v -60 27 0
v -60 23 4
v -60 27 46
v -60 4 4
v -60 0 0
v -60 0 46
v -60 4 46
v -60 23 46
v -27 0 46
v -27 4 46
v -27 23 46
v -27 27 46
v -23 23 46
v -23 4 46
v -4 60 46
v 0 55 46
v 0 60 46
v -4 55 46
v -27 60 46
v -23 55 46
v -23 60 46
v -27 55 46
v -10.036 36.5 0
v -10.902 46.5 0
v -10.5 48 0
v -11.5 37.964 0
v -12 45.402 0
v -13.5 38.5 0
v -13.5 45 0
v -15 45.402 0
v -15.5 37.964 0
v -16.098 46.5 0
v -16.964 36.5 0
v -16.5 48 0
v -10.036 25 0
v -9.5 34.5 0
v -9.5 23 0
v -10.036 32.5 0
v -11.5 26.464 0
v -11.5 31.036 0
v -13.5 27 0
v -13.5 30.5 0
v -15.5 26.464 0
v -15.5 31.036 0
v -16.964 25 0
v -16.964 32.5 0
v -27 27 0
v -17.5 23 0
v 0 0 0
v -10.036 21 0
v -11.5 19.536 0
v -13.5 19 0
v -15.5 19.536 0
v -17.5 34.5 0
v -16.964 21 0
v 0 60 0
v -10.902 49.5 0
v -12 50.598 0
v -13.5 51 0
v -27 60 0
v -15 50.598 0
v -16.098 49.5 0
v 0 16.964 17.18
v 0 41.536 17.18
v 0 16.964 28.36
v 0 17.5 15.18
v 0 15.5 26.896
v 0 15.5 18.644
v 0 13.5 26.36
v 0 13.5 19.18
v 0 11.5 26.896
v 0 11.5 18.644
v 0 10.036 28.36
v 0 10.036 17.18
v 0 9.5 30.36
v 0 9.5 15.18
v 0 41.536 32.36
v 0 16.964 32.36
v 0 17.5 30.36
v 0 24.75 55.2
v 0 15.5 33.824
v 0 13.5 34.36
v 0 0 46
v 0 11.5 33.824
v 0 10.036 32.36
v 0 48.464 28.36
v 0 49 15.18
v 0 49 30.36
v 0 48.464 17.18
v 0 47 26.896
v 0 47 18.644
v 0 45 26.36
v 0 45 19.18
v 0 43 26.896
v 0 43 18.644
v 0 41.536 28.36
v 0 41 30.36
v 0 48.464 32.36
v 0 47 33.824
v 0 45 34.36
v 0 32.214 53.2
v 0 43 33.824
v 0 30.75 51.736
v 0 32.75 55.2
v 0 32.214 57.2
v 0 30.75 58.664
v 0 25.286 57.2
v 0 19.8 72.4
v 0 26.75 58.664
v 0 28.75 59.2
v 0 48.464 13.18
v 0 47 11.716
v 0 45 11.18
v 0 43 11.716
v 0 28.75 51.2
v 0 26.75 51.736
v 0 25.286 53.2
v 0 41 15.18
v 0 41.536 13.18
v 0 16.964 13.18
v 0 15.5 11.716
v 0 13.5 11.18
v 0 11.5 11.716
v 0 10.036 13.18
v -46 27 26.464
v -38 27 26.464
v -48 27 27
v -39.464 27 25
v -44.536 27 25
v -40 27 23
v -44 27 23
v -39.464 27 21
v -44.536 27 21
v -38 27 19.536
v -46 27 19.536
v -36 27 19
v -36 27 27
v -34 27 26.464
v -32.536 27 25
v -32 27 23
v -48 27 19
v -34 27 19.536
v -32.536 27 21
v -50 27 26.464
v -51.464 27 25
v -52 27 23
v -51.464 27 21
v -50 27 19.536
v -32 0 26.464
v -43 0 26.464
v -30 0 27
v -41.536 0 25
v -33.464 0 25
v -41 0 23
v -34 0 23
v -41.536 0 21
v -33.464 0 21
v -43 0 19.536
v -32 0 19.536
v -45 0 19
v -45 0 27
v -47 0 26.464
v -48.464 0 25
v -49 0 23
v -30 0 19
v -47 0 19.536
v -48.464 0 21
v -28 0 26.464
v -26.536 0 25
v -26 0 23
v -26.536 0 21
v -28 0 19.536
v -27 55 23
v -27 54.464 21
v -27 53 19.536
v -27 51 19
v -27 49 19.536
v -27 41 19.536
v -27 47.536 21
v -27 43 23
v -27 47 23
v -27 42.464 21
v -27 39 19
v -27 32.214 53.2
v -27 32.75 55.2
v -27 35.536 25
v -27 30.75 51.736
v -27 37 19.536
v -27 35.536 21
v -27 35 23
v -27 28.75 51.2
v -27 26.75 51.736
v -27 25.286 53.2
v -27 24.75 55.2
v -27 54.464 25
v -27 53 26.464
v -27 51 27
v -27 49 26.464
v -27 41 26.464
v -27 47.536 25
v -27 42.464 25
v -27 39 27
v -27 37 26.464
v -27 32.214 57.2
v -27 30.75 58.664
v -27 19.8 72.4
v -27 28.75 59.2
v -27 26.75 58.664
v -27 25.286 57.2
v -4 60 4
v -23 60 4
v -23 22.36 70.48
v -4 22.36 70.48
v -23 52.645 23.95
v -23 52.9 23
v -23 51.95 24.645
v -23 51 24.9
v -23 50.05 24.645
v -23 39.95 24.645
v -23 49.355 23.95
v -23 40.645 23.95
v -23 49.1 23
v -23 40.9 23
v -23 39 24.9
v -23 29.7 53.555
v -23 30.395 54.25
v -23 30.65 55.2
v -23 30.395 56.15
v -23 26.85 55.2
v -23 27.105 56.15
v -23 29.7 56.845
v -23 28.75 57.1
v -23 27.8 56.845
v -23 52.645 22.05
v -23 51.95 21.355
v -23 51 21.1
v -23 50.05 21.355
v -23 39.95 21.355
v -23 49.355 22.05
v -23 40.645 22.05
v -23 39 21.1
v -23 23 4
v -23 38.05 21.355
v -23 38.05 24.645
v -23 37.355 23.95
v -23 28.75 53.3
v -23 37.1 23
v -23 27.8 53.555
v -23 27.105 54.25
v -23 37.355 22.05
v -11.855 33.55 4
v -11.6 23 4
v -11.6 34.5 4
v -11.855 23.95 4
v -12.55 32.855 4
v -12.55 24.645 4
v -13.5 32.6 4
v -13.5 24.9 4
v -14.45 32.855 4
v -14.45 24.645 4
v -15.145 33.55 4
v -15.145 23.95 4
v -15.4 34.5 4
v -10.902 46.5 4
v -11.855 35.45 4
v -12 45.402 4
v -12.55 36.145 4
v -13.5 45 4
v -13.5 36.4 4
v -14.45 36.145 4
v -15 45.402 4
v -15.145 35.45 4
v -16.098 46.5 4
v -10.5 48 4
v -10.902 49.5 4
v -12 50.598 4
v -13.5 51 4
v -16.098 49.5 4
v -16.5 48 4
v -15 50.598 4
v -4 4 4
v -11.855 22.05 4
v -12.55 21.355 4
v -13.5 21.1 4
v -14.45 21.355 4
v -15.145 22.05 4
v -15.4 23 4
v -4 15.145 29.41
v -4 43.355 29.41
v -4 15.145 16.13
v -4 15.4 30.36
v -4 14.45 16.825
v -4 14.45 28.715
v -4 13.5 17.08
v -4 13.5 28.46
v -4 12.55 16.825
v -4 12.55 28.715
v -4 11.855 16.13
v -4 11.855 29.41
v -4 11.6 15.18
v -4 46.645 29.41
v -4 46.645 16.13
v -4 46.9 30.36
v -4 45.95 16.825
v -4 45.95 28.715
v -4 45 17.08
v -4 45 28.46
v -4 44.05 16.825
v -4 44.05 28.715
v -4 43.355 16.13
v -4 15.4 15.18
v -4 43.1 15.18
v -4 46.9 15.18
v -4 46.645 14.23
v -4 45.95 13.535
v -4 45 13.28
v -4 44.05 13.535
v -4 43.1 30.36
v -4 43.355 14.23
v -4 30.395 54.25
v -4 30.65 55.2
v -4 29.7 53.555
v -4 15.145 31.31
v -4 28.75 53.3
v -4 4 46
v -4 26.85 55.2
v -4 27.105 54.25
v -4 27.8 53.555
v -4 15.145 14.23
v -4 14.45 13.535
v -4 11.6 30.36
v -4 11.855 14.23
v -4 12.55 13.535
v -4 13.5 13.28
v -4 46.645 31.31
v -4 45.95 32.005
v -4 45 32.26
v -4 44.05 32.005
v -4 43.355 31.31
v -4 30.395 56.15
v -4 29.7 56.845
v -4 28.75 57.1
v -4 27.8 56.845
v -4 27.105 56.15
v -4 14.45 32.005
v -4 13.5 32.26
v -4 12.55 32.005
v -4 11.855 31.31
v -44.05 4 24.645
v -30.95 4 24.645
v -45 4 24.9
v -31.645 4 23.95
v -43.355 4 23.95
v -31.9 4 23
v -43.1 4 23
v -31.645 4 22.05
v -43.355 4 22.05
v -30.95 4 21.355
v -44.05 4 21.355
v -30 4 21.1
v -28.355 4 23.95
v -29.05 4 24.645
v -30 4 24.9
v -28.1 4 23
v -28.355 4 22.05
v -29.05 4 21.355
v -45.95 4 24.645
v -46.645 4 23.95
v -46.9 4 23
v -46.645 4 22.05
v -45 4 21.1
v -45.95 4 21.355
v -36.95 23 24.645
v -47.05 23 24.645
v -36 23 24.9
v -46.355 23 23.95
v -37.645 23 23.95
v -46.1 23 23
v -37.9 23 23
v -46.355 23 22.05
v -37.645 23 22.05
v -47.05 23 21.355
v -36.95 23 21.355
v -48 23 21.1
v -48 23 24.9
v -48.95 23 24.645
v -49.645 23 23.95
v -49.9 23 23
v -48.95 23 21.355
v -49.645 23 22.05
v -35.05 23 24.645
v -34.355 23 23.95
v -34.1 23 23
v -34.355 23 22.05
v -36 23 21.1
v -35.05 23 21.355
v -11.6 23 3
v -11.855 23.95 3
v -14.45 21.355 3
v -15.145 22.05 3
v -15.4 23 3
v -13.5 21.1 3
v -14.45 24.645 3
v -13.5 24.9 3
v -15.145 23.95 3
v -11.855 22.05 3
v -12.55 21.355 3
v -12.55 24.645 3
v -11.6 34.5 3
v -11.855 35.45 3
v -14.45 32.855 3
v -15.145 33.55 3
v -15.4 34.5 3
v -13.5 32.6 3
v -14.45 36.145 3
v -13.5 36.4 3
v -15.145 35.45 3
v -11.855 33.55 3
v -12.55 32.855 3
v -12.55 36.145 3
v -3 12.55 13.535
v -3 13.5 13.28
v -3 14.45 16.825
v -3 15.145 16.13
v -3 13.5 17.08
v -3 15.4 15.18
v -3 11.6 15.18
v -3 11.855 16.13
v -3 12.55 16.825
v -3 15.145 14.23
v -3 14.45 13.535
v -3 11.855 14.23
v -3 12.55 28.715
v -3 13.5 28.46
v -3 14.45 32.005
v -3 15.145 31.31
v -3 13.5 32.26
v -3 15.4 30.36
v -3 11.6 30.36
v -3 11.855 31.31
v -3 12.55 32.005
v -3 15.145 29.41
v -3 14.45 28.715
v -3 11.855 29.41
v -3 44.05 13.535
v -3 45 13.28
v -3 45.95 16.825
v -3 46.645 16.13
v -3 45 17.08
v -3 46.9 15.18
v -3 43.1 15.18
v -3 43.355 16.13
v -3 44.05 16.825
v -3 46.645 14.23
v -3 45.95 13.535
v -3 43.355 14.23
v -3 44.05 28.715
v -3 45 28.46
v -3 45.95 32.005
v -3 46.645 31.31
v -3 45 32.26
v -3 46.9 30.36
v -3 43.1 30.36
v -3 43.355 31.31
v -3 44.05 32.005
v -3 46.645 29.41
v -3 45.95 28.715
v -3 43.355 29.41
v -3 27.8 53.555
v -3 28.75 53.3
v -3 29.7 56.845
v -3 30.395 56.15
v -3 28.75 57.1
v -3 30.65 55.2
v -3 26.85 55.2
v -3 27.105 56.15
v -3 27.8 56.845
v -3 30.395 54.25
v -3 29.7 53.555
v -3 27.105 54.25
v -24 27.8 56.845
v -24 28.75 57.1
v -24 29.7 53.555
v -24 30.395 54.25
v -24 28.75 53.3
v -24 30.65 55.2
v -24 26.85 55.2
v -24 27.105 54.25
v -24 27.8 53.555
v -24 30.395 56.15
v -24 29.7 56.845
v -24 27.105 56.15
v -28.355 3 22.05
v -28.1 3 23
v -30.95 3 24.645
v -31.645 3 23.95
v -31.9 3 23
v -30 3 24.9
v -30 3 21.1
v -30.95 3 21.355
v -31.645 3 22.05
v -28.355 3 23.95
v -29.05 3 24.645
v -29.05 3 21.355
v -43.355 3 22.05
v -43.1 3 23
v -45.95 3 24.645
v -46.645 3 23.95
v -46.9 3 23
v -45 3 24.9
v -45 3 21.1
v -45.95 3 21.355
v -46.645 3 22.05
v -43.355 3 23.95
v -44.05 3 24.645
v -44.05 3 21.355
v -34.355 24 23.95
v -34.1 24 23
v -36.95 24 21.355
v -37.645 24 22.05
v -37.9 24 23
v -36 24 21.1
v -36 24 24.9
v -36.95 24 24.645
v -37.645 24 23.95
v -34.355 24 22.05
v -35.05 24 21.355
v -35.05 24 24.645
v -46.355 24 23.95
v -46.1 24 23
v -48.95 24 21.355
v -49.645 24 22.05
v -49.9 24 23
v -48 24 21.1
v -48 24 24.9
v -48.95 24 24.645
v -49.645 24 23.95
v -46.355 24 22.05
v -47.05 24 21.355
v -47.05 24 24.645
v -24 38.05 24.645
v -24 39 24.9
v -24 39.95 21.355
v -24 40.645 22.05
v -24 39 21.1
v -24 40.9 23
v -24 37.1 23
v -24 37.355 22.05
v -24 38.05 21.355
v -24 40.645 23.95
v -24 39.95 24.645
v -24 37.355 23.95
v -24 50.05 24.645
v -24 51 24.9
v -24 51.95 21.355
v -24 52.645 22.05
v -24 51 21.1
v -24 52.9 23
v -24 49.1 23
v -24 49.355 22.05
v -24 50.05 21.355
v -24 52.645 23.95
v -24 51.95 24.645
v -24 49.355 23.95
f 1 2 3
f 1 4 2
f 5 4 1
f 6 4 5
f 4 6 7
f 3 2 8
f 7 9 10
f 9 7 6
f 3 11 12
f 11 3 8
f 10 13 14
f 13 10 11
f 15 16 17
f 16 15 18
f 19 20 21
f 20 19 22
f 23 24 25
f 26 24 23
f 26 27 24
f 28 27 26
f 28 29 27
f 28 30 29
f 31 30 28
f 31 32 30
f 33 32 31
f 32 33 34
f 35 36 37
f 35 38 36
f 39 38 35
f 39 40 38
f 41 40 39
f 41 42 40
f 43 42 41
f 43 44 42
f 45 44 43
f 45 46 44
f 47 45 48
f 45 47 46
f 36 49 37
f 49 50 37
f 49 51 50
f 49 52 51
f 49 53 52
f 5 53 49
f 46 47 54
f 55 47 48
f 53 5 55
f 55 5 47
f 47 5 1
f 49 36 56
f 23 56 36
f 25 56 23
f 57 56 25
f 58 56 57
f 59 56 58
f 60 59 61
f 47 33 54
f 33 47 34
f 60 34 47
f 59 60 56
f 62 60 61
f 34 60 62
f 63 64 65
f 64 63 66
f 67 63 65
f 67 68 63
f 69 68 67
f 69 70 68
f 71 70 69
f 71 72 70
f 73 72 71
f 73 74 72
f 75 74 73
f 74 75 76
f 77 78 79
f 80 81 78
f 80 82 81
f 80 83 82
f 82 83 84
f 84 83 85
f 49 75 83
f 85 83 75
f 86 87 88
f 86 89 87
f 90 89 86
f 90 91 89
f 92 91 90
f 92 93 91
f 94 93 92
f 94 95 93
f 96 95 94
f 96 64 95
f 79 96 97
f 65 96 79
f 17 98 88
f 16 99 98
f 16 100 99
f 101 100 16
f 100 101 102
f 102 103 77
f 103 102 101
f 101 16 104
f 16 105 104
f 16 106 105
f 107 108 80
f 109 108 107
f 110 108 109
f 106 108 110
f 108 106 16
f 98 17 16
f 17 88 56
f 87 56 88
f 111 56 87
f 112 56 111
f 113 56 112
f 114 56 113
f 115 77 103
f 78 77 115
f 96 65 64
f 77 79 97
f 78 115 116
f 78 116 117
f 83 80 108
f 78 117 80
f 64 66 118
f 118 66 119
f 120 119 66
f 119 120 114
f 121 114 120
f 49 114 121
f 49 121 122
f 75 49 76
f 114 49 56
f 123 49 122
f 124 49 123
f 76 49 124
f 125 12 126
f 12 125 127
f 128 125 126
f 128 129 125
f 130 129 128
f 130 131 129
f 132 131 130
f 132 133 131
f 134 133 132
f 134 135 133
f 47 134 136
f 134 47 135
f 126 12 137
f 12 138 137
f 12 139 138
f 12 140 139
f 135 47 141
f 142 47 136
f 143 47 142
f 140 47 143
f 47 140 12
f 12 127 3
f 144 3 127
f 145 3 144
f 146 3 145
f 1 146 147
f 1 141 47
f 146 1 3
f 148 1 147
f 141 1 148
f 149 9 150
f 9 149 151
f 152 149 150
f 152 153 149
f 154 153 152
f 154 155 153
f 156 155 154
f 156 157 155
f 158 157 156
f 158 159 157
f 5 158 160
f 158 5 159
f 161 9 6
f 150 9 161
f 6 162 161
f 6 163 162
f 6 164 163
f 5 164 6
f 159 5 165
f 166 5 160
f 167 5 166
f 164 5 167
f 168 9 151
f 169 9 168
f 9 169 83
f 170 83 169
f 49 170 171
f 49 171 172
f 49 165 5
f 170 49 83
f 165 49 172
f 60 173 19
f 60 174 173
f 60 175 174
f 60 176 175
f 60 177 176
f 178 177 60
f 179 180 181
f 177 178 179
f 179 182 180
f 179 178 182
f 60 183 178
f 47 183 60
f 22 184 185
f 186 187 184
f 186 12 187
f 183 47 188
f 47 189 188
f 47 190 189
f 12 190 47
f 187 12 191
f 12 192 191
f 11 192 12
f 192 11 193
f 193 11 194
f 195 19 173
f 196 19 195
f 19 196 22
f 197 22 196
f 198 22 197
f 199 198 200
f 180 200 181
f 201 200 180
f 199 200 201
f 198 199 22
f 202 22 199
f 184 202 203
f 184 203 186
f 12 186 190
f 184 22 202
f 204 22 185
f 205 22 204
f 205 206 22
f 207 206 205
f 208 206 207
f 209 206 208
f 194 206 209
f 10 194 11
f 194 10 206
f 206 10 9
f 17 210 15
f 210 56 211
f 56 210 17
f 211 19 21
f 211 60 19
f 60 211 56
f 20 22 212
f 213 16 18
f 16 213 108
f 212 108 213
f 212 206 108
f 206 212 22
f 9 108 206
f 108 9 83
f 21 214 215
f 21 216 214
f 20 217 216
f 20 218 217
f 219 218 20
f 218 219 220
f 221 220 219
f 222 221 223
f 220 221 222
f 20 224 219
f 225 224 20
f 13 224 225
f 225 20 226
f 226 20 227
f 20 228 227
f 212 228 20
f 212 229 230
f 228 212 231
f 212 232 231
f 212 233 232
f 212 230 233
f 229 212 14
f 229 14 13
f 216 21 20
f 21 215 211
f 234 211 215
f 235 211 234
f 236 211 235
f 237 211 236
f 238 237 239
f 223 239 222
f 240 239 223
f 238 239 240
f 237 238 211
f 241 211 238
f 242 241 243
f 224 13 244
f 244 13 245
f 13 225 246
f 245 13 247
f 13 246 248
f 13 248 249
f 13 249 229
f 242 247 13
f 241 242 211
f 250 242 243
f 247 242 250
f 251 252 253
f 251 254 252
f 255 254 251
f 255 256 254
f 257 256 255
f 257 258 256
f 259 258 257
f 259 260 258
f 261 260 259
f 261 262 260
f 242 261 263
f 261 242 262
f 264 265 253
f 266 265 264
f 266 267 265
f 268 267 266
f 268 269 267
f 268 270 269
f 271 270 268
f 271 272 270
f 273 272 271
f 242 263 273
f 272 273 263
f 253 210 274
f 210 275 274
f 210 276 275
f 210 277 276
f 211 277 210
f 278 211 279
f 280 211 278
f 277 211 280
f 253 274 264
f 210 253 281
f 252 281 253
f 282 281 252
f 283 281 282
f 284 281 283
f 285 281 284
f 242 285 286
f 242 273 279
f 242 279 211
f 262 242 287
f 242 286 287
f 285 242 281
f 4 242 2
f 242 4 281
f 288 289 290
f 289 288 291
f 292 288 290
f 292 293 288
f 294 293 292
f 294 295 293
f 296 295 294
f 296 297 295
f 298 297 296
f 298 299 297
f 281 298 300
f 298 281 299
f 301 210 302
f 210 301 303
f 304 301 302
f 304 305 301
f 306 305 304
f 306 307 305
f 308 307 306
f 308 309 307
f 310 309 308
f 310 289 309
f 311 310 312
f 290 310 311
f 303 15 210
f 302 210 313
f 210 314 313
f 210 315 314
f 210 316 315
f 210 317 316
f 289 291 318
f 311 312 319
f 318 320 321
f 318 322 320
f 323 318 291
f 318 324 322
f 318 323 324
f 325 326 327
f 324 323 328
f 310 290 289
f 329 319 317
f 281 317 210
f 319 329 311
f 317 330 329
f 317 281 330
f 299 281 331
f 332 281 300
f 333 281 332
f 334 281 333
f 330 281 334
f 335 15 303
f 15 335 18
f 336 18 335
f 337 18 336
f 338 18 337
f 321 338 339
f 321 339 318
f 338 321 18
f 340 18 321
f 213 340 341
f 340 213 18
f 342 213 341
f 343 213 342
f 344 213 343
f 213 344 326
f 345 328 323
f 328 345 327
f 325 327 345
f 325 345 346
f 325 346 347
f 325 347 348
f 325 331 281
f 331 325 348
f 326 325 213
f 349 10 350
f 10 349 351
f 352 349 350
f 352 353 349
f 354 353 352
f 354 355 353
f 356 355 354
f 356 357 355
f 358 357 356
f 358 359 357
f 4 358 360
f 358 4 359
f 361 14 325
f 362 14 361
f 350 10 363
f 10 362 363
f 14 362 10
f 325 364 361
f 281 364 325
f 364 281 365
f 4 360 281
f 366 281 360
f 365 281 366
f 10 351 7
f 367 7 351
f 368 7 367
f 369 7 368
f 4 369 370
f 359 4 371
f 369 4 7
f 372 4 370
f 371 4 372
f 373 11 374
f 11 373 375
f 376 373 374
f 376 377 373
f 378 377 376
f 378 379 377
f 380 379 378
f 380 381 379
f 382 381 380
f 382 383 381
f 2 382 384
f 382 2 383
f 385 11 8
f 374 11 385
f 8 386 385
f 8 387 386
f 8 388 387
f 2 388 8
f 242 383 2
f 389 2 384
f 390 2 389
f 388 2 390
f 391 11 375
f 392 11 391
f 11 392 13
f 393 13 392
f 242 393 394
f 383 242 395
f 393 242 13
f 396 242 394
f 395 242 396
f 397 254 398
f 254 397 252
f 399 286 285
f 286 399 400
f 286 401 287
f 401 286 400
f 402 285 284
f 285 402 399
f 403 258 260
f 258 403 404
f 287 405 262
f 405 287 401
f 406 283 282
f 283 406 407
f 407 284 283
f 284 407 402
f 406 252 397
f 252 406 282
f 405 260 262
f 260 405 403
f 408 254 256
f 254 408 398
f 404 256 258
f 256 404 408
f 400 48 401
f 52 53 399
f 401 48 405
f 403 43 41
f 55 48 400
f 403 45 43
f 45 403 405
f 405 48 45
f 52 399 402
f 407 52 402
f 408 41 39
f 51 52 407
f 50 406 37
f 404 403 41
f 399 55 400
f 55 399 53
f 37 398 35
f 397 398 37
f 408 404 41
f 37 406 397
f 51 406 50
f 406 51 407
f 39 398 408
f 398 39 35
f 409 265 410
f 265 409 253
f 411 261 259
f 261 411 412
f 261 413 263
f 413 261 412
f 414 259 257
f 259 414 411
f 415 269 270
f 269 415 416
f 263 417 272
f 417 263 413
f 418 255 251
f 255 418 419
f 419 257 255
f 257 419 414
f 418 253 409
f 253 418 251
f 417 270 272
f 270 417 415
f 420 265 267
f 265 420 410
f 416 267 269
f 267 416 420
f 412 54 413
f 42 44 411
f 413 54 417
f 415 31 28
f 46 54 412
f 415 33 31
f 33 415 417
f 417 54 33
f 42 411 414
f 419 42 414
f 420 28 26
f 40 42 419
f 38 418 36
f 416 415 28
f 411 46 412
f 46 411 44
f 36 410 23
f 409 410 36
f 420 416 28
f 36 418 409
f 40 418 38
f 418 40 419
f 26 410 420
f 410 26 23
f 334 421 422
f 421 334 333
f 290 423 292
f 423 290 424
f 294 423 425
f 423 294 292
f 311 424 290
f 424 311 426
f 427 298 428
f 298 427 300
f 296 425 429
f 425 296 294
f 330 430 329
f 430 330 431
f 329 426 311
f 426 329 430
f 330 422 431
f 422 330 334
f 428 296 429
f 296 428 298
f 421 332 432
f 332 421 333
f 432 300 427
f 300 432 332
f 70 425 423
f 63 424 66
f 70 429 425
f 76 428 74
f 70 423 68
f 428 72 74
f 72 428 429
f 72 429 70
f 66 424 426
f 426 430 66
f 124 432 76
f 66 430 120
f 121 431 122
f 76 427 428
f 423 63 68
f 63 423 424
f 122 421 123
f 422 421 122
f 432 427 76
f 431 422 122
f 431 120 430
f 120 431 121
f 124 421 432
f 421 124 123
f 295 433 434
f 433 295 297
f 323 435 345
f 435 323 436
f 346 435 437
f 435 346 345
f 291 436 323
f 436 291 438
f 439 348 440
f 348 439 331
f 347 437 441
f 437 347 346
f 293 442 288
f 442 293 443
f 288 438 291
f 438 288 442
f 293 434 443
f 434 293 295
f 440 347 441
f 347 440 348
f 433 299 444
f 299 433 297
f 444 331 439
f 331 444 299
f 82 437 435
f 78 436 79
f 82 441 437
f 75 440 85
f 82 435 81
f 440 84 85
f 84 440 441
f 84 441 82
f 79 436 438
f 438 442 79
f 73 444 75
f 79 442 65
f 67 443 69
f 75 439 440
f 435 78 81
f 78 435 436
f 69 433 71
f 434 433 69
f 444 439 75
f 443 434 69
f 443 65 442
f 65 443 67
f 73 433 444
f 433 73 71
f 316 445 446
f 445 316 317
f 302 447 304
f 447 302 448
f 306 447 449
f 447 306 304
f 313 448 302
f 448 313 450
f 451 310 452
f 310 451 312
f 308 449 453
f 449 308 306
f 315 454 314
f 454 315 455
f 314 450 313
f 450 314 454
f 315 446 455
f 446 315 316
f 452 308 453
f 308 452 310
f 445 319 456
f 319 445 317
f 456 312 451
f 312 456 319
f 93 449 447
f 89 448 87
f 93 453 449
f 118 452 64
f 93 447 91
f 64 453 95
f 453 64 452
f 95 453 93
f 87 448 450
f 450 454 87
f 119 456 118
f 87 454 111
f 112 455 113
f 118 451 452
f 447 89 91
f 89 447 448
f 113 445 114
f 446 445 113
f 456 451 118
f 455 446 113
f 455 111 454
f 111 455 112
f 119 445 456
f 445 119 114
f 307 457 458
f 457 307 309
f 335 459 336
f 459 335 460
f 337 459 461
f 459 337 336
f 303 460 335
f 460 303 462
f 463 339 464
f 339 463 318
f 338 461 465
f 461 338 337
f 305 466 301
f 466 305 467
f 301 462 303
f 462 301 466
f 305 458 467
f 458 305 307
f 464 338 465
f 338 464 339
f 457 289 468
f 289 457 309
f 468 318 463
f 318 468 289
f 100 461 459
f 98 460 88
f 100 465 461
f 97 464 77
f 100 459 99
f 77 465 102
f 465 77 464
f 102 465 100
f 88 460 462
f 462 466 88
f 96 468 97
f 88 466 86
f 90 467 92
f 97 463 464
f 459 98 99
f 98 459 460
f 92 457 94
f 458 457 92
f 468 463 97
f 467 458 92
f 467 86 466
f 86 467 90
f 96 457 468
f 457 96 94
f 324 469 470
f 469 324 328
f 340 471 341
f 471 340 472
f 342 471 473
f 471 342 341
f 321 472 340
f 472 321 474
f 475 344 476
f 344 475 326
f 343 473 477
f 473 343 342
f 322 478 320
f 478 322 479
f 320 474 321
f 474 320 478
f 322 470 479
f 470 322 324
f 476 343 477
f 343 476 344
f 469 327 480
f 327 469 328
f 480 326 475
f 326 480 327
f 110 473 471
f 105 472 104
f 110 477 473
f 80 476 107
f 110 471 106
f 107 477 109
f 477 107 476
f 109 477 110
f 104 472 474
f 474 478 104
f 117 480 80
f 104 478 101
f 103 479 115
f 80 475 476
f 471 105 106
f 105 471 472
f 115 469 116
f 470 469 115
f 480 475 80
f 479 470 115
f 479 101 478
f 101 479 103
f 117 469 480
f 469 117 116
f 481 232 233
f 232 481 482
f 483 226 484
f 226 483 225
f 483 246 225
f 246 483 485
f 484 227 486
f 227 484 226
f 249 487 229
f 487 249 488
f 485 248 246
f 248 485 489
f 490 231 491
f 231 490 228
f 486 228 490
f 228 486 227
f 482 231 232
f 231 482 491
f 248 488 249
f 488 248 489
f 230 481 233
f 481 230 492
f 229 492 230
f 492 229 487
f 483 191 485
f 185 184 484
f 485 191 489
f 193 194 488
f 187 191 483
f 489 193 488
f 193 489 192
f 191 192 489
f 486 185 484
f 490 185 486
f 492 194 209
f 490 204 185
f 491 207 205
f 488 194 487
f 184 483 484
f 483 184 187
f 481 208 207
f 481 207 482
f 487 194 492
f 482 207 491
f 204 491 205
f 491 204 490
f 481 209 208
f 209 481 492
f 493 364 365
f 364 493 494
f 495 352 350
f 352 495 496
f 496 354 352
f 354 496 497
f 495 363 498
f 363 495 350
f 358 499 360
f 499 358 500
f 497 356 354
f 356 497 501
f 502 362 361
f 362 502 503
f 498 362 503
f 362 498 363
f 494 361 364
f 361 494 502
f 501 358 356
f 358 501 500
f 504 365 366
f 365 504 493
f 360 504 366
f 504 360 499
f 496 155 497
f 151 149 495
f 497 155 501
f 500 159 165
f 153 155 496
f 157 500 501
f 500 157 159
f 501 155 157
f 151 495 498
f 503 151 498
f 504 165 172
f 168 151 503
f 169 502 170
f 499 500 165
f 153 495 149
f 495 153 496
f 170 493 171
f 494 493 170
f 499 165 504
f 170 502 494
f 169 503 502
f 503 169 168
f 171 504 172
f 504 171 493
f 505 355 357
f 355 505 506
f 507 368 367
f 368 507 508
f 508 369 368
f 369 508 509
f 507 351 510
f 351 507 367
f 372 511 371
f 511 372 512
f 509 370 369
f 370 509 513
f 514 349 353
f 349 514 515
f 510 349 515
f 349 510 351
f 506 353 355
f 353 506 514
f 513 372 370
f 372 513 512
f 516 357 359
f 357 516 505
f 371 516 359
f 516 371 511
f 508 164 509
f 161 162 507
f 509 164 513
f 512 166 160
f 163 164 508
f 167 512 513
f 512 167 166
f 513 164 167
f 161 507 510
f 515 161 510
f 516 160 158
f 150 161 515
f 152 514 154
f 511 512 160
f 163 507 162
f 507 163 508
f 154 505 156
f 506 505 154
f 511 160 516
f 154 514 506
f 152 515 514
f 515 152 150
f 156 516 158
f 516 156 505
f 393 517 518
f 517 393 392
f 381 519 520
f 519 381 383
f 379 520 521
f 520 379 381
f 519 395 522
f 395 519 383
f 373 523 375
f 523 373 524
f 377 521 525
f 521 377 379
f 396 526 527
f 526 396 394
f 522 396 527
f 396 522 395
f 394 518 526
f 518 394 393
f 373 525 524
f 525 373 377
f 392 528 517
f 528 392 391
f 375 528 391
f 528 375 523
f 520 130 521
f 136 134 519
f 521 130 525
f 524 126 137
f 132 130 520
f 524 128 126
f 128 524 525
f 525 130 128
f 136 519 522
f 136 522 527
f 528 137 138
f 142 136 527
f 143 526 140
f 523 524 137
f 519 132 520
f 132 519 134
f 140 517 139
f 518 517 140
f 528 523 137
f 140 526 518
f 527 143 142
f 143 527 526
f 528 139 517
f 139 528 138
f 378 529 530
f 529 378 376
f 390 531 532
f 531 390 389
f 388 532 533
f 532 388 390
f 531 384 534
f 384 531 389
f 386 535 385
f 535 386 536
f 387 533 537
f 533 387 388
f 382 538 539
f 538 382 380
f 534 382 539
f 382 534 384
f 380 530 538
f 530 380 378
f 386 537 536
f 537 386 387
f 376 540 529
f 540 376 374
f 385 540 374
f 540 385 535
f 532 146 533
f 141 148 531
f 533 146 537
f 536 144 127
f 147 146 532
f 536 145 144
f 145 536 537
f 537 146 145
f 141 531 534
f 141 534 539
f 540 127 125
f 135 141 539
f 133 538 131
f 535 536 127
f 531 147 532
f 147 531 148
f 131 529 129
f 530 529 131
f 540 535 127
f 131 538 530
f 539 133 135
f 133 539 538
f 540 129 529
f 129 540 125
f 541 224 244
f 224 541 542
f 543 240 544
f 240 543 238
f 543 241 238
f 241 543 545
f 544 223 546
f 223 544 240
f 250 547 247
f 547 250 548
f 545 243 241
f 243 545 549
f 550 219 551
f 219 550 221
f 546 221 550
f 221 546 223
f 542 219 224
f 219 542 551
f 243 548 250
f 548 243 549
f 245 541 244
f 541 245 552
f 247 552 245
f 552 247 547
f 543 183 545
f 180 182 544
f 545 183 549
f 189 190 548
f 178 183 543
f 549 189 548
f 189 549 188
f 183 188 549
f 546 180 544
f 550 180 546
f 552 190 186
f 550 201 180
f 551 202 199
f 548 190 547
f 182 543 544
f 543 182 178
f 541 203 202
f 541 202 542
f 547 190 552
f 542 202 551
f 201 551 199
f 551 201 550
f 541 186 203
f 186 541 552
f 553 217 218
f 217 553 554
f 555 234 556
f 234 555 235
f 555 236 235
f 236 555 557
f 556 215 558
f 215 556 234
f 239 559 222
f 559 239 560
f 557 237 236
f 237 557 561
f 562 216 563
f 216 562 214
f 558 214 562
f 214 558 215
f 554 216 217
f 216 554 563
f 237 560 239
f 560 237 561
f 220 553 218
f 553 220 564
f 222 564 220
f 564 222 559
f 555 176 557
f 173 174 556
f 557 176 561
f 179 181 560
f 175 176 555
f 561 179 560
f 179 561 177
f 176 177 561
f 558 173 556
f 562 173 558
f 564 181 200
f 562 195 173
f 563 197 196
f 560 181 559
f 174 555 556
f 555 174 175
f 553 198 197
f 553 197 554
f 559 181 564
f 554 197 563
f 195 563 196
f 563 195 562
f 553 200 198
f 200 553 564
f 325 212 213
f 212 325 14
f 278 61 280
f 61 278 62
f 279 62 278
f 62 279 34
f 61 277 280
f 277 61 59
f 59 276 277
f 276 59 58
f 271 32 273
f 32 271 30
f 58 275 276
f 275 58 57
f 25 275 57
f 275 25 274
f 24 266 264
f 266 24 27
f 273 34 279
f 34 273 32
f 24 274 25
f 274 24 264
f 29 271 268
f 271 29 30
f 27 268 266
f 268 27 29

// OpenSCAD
difference(){
	scale(v = [-1, 1, 1]) {
		union() {
			cube(size = [60, 27, 46]);
			cube(size = [27, 60, 46]);
			translate(v = [0, 0, 46]) {
				rotate(a = -36.8700000000, v = [1, 0, 0]) {
					translate(v = [0, 0, 0]) {
						cube(size = [27, 46, 33]);
					}
				}
			}
			translate(v = [13.5000000000, 23.0000000000, 0]) {
				rotate(a = 180, v = [1, 0, 0]) {
				}
			}
			translate(v = [13.5000000000, 34.5000000000, 0]) {
				rotate(a = 180, v = [1, 0, 0]) {
				}
			}
			translate(v = [0, 13.5000000000, 15.1800000000]) {
				rotate(a = -90, v = [0, 1, 0]) {
				}
			}
			translate(v = [0, 13.5000000000, 30.3600000000]) {
				rotate(a = -90, v = [0, 1, 0]) {
				}
			}
			translate(v = [0, 45.0000000000, 15.1800000000]) {
				rotate(a = -90, v = [0, 1, 0]) {
				}
			}
			translate(v = [0, 45.0000000000, 30.3600000000]) {
				rotate(a = -90, v = [0, 1, 0]) {
				}
			}
			translate(v = [0, 28.7500000000, 55.2000000000]) {
				rotate(a = -90, v = [0, 1, 0]) {
				}
			}
			translate(v = [27, 28.7500000000, 55.2000000000]) {
				rotate(a = 90, v = [0, 1, 0]) {
				}
			}
			translate(v = [30.0000000000, 0, 23.0000000000]) {
				rotate(a = 90, v = [1, 0, 0]) {
				}
			}
			translate(v = [45.0000000000, 0, 23.0000000000]) {
				rotate(a = 90, v = [1, 0, 0]) {
				}
			}
			translate(v = [36.0000000000, 27, 23.0000000000]) {
				rotate(a = -90, v = [1, 0, 0]) {
				}
			}
			translate(v = [48.0000000000, 27, 23.0000000000]) {
				rotate(a = -90, v = [1, 0, 0]) {
				}
			}
			translate(v = [27, 39.0000000000, 23.0000000000]) {
				rotate(a = 90, v = [0, 1, 0]) {
				}
			}
			translate(v = [27, 51.0000000000, 23.0000000000]) {
				rotate(a = 90, v = [0, 1, 0]) {
				}
			}
			translate(v = [13.5000000000, 48.0000000000, -1]) {
			}
		}
	}
	/* Holes Below*/
	scale(v = [-1, 1, 1]){
		union(){
			translate(v = [4, 4, 4]) {
				cube(size = [19, 60, 42]);
				cube(size = [60, 19, 42]);
			}
			translate(v = [4, 4, 46]) {
				rotate(a = -36.8700000000, v = [1, 0, 0]) {
					translate(v = [0, 0, 0]) {
						cube(size = [19, 60, 38]);
					}
				}
			}
			translate(v = [13.5000000000, 23.0000000000, 0]){
				rotate(a = 180, v = [1, 0, 0]){
					union() {
						union() {
							translate(v = [0, 0, -5]) {
								cylinder($fn = 12, h = 5, r = 1.9000000000);
							}
							translate(v = [0, 0, -3]) {
								cylinder($fn = 12, h = 3, r1 = 1.9000000000, r2 = 4);
							}
						}
						cylinder($fn = 12, h = 1, r = 4);
					}
				}
			}
			translate(v = [13.5000000000, 34.5000000000, 0]){
				rotate(a = 180, v = [1, 0, 0]){
					union() {
						union() {
							translate(v = [0, 0, -5]) {
								cylinder($fn = 12, h = 5, r = 1.9000000000);
							}
							translate(v = [0, 0, -3]) {
								cylinder($fn = 12, h = 3, r1 = 1.9000000000, r2 = 4);
							}
						}
						cylinder($fn = 12, h = 1, r = 4);
					}
				}
			}
			translate(v = [0, 13.5000000000, 15.1800000000]){
				rotate(a = -90, v = [0, 1, 0]){
					union() {
						union() {
							translate(v = [0, 0, -5]) {
								cylinder($fn = 12, h = 5, r = 1.9000000000);
							}
							translate(v = [0, 0, -3]) {
								cylinder($fn = 12, h = 3, r1 = 1.9000000000, r2 = 4);
							}
						}
						cylinder($fn = 12, h = 1, r = 4);
					}
				}
			}
			translate(v = [0, 13.5000000000, 30.3600000000]){
				rotate(a = -90, v = [0, 1, 0]){
					union() {
						union() {
							translate(v = [0, 0, -5]) {
								cylinder($fn = 12, h = 5, r = 1.9000000000);
							}
							translate(v = [0, 0, -3]) {
								cylinder($fn = 12, h = 3, r1 = 1.9000000000, r2 = 4);
							}
						}
						cylinder($fn = 12, h = 1, r = 4);
					}
				}
			}
			translate(v = [0, 45.0000000000, 15.1800000000]){
				rotate(a = -90, v = [0, 1, 0]){
					union() {
						union() {
							translate(v = [0, 0, -5]) {
								cylinder($fn = 12, h = 5, r = 1.9000000000);
							}
							translate(v = [0, 0, -3]) {
								cylinder($fn = 12, h = 3, r1 = 1.9000000000, r2 = 4);
							}
						}
						cylinder($fn = 12, h = 1, r = 4);
					}
				}
			}
			translate(v = [0, 45.0000000000, 30.3600000000]){
				rotate(a = -90, v = [0, 1, 0]){
					union() {
						union() {
							translate(v = [0, 0, -5]) {
								cylinder($fn = 12, h = 5, r = 1.9000000000);
							}
							translate(v = [0, 0, -3]) {
								cylinder($fn = 12, h = 3, r1 = 1.9000000000, r2 = 4);
							}
						}
						cylinder($fn = 12, h = 1, r = 4);
					}
				}
			}
			translate(v = [0, 28.7500000000, 55.2000000000]){
				rotate(a = -90, v = [0, 1, 0]){
					union() {
						union() {
							translate(v = [0, 0, -5]) {
								cylinder($fn = 12, h = 5, r = 1.9000000000);
							}
							translate(v = [0, 0, -3]) {
								cylinder($fn = 12, h = 3, r1 = 1.9000000000, r2 = 4);
							}
						}
						cylinder($fn = 12, h = 1, r = 4);
					}
				}
			}
			translate(v = [27, 28.7500000000, 55.2000000000]){
				rotate(a = 90, v = [0, 1, 0]){
					union() {
						union() {
							translate(v = [0, 0, -5]) {
								cylinder($fn = 12, h = 5, r = 1.9000000000);
							}
							translate(v = [0, 0, -3]) {
								cylinder($fn = 12, h = 3, r1 = 1.9000000000, r2 = 4);
							}
						}
						cylinder($fn = 12, h = 1, r = 4);
					}
				}
			}
			translate(v = [30.0000000000, 0, 23.0000000000]){
				rotate(a = 90, v = [1, 0, 0]){
					union() {
						union() {
							translate(v = [0, 0, -5]) {
								cylinder($fn = 12, h = 5, r = 1.9000000000);
							}
							translate(v = [0, 0, -3]) {
								cylinder($fn = 12, h = 3, r1 = 1.9000000000, r2 = 4);
							}
						}
						cylinder($fn = 12, h = 1, r = 4);
					}
				}
			}
			translate(v = [45.0000000000, 0, 23.0000000000]){
				rotate(a = 90, v = [1, 0, 0]){
					union() {
						union() {
							translate(v = [0, 0, -5]) {
								cylinder($fn = 12, h = 5, r = 1.9000000000);
							}
							translate(v = [0, 0, -3]) {
								cylinder($fn = 12, h = 3, r1 = 1.9000000000, r2 = 4);
							}
						}
						cylinder($fn = 12, h = 1, r = 4);
					}
				}
			}
			translate(v = [36.0000000000, 27, 23.0000000000]){
				rotate(a = -90, v = [1, 0, 0]){
					union() {
						union() {
							translate(v = [0, 0, -5]) {
								cylinder($fn = 12, h = 5, r = 1.9000000000);
							}
							translate(v = [0, 0, -3]) {
								cylinder($fn = 12, h = 3, r1 = 1.9000000000, r2 = 4);
							}
						}
						cylinder($fn = 12, h = 1, r = 4);
					}
				}
			}
			translate(v = [48.0000000000, 27, 23.0000000000]){
				rotate(a = -90, v = [1, 0, 0]){
					union() {
						union() {
							translate(v = [0, 0, -5]) {
								cylinder($fn = 12, h = 5, r = 1.9000000000);
							}
							translate(v = [0, 0, -3]) {
								cylinder($fn = 12, h = 3, r1 = 1.9000000000, r2 = 4);
							}
						}
						cylinder($fn = 12, h = 1, r = 4);
					}
				}
			}
			translate(v = [27, 39.0000000000, 23.0000000000]){
				rotate(a = 90, v = [0, 1, 0]){
					union() {
						union() {
							translate(v = [0, 0, -5]) {
								cylinder($fn = 12, h = 5, r = 1.9000000000);
							}
							translate(v = [0, 0, -3]) {
								cylinder($fn = 12, h = 3, r1 = 1.9000000000, r2 = 4);
							}
						}
						cylinder($fn = 12, h = 1, r = 4);
					}
				}
			}
			translate(v = [27, 51.0000000000, 23.0000000000]){
				rotate(a = 90, v = [0, 1, 0]){
					union() {
						union() {
							translate(v = [0, 0, -5]) {
								cylinder($fn = 12, h = 5, r = 1.9000000000);
							}
							translate(v = [0, 0, -3]) {
								cylinder($fn = 12, h = 3, r1 = 1.9000000000, r2 = 4);
							}
						}
						cylinder($fn = 12, h = 1, r = 4);
					}
				}
			}
			translate(v = [13.5000000000, 48.0000000000, -1]){
				cylinder($fn = 12, h = 6, r = 3);
			}
		}
	} /* End Holes */ 
}
